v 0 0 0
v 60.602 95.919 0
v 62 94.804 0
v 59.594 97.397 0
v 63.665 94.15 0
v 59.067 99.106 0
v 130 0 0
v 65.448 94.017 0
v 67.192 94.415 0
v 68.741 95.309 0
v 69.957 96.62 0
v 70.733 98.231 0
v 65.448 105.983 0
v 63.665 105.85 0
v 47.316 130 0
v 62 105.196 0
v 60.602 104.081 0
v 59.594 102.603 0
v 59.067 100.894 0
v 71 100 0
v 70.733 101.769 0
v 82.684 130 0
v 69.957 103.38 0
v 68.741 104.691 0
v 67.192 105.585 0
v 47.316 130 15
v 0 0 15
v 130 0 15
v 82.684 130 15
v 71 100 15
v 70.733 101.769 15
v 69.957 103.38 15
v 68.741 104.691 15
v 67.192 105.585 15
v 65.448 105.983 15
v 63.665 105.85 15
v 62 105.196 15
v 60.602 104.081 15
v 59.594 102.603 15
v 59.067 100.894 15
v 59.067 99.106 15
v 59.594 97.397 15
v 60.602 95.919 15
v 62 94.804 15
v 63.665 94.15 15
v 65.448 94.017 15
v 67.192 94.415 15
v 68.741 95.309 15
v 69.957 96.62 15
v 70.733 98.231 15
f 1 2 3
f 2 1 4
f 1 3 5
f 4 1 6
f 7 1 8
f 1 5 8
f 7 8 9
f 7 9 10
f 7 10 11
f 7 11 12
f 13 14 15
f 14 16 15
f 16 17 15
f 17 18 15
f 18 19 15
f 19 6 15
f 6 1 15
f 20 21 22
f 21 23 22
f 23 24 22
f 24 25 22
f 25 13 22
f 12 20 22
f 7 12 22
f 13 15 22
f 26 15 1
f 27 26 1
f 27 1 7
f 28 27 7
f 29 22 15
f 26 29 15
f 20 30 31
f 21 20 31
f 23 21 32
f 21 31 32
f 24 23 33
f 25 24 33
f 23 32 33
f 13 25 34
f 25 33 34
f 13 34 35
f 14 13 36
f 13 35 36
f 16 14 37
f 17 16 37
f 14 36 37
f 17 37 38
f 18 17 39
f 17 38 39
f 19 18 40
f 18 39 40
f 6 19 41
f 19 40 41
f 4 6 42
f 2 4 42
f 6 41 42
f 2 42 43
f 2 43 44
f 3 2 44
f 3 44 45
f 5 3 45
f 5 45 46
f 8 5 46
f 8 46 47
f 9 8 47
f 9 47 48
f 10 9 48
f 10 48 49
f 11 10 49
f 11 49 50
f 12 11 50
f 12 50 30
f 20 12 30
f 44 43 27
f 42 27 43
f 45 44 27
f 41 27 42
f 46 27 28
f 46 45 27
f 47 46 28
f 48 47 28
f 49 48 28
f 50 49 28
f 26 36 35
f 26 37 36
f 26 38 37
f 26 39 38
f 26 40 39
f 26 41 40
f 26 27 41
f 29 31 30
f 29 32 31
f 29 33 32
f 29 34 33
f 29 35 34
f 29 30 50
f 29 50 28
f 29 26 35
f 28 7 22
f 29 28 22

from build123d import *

# Parameters (mm, degrees)
RESSALTO_EXTRUS_O1_DEPTH = 15
ESBO_O2_R                = 6
CORTE_EXTRUS_O1_DEPTH    = 185.458667457


with BuildPart() as part:
    # Esboço1 → Ressalto-extrusão1 (new body)
    with BuildSketch(Plane.XY):
        Polygon((0, 0), (130, 0), (82.683869545, 130), (47.316130455, 130), align=None)
    extrude(amount=RESSALTO_EXTRUS_O1_DEPTH)

    # Esboço2 → Corte-extrusão1 (cut, through all)
    with BuildSketch(Plane.XY.offset(15)):
        with Locations((65, 100)):
            Circle(ESBO_O2_R)
    extrude(amount=-CORTE_EXTRUS_O1_DEPTH, mode=Mode.SUBTRACT)


solid = part.part
